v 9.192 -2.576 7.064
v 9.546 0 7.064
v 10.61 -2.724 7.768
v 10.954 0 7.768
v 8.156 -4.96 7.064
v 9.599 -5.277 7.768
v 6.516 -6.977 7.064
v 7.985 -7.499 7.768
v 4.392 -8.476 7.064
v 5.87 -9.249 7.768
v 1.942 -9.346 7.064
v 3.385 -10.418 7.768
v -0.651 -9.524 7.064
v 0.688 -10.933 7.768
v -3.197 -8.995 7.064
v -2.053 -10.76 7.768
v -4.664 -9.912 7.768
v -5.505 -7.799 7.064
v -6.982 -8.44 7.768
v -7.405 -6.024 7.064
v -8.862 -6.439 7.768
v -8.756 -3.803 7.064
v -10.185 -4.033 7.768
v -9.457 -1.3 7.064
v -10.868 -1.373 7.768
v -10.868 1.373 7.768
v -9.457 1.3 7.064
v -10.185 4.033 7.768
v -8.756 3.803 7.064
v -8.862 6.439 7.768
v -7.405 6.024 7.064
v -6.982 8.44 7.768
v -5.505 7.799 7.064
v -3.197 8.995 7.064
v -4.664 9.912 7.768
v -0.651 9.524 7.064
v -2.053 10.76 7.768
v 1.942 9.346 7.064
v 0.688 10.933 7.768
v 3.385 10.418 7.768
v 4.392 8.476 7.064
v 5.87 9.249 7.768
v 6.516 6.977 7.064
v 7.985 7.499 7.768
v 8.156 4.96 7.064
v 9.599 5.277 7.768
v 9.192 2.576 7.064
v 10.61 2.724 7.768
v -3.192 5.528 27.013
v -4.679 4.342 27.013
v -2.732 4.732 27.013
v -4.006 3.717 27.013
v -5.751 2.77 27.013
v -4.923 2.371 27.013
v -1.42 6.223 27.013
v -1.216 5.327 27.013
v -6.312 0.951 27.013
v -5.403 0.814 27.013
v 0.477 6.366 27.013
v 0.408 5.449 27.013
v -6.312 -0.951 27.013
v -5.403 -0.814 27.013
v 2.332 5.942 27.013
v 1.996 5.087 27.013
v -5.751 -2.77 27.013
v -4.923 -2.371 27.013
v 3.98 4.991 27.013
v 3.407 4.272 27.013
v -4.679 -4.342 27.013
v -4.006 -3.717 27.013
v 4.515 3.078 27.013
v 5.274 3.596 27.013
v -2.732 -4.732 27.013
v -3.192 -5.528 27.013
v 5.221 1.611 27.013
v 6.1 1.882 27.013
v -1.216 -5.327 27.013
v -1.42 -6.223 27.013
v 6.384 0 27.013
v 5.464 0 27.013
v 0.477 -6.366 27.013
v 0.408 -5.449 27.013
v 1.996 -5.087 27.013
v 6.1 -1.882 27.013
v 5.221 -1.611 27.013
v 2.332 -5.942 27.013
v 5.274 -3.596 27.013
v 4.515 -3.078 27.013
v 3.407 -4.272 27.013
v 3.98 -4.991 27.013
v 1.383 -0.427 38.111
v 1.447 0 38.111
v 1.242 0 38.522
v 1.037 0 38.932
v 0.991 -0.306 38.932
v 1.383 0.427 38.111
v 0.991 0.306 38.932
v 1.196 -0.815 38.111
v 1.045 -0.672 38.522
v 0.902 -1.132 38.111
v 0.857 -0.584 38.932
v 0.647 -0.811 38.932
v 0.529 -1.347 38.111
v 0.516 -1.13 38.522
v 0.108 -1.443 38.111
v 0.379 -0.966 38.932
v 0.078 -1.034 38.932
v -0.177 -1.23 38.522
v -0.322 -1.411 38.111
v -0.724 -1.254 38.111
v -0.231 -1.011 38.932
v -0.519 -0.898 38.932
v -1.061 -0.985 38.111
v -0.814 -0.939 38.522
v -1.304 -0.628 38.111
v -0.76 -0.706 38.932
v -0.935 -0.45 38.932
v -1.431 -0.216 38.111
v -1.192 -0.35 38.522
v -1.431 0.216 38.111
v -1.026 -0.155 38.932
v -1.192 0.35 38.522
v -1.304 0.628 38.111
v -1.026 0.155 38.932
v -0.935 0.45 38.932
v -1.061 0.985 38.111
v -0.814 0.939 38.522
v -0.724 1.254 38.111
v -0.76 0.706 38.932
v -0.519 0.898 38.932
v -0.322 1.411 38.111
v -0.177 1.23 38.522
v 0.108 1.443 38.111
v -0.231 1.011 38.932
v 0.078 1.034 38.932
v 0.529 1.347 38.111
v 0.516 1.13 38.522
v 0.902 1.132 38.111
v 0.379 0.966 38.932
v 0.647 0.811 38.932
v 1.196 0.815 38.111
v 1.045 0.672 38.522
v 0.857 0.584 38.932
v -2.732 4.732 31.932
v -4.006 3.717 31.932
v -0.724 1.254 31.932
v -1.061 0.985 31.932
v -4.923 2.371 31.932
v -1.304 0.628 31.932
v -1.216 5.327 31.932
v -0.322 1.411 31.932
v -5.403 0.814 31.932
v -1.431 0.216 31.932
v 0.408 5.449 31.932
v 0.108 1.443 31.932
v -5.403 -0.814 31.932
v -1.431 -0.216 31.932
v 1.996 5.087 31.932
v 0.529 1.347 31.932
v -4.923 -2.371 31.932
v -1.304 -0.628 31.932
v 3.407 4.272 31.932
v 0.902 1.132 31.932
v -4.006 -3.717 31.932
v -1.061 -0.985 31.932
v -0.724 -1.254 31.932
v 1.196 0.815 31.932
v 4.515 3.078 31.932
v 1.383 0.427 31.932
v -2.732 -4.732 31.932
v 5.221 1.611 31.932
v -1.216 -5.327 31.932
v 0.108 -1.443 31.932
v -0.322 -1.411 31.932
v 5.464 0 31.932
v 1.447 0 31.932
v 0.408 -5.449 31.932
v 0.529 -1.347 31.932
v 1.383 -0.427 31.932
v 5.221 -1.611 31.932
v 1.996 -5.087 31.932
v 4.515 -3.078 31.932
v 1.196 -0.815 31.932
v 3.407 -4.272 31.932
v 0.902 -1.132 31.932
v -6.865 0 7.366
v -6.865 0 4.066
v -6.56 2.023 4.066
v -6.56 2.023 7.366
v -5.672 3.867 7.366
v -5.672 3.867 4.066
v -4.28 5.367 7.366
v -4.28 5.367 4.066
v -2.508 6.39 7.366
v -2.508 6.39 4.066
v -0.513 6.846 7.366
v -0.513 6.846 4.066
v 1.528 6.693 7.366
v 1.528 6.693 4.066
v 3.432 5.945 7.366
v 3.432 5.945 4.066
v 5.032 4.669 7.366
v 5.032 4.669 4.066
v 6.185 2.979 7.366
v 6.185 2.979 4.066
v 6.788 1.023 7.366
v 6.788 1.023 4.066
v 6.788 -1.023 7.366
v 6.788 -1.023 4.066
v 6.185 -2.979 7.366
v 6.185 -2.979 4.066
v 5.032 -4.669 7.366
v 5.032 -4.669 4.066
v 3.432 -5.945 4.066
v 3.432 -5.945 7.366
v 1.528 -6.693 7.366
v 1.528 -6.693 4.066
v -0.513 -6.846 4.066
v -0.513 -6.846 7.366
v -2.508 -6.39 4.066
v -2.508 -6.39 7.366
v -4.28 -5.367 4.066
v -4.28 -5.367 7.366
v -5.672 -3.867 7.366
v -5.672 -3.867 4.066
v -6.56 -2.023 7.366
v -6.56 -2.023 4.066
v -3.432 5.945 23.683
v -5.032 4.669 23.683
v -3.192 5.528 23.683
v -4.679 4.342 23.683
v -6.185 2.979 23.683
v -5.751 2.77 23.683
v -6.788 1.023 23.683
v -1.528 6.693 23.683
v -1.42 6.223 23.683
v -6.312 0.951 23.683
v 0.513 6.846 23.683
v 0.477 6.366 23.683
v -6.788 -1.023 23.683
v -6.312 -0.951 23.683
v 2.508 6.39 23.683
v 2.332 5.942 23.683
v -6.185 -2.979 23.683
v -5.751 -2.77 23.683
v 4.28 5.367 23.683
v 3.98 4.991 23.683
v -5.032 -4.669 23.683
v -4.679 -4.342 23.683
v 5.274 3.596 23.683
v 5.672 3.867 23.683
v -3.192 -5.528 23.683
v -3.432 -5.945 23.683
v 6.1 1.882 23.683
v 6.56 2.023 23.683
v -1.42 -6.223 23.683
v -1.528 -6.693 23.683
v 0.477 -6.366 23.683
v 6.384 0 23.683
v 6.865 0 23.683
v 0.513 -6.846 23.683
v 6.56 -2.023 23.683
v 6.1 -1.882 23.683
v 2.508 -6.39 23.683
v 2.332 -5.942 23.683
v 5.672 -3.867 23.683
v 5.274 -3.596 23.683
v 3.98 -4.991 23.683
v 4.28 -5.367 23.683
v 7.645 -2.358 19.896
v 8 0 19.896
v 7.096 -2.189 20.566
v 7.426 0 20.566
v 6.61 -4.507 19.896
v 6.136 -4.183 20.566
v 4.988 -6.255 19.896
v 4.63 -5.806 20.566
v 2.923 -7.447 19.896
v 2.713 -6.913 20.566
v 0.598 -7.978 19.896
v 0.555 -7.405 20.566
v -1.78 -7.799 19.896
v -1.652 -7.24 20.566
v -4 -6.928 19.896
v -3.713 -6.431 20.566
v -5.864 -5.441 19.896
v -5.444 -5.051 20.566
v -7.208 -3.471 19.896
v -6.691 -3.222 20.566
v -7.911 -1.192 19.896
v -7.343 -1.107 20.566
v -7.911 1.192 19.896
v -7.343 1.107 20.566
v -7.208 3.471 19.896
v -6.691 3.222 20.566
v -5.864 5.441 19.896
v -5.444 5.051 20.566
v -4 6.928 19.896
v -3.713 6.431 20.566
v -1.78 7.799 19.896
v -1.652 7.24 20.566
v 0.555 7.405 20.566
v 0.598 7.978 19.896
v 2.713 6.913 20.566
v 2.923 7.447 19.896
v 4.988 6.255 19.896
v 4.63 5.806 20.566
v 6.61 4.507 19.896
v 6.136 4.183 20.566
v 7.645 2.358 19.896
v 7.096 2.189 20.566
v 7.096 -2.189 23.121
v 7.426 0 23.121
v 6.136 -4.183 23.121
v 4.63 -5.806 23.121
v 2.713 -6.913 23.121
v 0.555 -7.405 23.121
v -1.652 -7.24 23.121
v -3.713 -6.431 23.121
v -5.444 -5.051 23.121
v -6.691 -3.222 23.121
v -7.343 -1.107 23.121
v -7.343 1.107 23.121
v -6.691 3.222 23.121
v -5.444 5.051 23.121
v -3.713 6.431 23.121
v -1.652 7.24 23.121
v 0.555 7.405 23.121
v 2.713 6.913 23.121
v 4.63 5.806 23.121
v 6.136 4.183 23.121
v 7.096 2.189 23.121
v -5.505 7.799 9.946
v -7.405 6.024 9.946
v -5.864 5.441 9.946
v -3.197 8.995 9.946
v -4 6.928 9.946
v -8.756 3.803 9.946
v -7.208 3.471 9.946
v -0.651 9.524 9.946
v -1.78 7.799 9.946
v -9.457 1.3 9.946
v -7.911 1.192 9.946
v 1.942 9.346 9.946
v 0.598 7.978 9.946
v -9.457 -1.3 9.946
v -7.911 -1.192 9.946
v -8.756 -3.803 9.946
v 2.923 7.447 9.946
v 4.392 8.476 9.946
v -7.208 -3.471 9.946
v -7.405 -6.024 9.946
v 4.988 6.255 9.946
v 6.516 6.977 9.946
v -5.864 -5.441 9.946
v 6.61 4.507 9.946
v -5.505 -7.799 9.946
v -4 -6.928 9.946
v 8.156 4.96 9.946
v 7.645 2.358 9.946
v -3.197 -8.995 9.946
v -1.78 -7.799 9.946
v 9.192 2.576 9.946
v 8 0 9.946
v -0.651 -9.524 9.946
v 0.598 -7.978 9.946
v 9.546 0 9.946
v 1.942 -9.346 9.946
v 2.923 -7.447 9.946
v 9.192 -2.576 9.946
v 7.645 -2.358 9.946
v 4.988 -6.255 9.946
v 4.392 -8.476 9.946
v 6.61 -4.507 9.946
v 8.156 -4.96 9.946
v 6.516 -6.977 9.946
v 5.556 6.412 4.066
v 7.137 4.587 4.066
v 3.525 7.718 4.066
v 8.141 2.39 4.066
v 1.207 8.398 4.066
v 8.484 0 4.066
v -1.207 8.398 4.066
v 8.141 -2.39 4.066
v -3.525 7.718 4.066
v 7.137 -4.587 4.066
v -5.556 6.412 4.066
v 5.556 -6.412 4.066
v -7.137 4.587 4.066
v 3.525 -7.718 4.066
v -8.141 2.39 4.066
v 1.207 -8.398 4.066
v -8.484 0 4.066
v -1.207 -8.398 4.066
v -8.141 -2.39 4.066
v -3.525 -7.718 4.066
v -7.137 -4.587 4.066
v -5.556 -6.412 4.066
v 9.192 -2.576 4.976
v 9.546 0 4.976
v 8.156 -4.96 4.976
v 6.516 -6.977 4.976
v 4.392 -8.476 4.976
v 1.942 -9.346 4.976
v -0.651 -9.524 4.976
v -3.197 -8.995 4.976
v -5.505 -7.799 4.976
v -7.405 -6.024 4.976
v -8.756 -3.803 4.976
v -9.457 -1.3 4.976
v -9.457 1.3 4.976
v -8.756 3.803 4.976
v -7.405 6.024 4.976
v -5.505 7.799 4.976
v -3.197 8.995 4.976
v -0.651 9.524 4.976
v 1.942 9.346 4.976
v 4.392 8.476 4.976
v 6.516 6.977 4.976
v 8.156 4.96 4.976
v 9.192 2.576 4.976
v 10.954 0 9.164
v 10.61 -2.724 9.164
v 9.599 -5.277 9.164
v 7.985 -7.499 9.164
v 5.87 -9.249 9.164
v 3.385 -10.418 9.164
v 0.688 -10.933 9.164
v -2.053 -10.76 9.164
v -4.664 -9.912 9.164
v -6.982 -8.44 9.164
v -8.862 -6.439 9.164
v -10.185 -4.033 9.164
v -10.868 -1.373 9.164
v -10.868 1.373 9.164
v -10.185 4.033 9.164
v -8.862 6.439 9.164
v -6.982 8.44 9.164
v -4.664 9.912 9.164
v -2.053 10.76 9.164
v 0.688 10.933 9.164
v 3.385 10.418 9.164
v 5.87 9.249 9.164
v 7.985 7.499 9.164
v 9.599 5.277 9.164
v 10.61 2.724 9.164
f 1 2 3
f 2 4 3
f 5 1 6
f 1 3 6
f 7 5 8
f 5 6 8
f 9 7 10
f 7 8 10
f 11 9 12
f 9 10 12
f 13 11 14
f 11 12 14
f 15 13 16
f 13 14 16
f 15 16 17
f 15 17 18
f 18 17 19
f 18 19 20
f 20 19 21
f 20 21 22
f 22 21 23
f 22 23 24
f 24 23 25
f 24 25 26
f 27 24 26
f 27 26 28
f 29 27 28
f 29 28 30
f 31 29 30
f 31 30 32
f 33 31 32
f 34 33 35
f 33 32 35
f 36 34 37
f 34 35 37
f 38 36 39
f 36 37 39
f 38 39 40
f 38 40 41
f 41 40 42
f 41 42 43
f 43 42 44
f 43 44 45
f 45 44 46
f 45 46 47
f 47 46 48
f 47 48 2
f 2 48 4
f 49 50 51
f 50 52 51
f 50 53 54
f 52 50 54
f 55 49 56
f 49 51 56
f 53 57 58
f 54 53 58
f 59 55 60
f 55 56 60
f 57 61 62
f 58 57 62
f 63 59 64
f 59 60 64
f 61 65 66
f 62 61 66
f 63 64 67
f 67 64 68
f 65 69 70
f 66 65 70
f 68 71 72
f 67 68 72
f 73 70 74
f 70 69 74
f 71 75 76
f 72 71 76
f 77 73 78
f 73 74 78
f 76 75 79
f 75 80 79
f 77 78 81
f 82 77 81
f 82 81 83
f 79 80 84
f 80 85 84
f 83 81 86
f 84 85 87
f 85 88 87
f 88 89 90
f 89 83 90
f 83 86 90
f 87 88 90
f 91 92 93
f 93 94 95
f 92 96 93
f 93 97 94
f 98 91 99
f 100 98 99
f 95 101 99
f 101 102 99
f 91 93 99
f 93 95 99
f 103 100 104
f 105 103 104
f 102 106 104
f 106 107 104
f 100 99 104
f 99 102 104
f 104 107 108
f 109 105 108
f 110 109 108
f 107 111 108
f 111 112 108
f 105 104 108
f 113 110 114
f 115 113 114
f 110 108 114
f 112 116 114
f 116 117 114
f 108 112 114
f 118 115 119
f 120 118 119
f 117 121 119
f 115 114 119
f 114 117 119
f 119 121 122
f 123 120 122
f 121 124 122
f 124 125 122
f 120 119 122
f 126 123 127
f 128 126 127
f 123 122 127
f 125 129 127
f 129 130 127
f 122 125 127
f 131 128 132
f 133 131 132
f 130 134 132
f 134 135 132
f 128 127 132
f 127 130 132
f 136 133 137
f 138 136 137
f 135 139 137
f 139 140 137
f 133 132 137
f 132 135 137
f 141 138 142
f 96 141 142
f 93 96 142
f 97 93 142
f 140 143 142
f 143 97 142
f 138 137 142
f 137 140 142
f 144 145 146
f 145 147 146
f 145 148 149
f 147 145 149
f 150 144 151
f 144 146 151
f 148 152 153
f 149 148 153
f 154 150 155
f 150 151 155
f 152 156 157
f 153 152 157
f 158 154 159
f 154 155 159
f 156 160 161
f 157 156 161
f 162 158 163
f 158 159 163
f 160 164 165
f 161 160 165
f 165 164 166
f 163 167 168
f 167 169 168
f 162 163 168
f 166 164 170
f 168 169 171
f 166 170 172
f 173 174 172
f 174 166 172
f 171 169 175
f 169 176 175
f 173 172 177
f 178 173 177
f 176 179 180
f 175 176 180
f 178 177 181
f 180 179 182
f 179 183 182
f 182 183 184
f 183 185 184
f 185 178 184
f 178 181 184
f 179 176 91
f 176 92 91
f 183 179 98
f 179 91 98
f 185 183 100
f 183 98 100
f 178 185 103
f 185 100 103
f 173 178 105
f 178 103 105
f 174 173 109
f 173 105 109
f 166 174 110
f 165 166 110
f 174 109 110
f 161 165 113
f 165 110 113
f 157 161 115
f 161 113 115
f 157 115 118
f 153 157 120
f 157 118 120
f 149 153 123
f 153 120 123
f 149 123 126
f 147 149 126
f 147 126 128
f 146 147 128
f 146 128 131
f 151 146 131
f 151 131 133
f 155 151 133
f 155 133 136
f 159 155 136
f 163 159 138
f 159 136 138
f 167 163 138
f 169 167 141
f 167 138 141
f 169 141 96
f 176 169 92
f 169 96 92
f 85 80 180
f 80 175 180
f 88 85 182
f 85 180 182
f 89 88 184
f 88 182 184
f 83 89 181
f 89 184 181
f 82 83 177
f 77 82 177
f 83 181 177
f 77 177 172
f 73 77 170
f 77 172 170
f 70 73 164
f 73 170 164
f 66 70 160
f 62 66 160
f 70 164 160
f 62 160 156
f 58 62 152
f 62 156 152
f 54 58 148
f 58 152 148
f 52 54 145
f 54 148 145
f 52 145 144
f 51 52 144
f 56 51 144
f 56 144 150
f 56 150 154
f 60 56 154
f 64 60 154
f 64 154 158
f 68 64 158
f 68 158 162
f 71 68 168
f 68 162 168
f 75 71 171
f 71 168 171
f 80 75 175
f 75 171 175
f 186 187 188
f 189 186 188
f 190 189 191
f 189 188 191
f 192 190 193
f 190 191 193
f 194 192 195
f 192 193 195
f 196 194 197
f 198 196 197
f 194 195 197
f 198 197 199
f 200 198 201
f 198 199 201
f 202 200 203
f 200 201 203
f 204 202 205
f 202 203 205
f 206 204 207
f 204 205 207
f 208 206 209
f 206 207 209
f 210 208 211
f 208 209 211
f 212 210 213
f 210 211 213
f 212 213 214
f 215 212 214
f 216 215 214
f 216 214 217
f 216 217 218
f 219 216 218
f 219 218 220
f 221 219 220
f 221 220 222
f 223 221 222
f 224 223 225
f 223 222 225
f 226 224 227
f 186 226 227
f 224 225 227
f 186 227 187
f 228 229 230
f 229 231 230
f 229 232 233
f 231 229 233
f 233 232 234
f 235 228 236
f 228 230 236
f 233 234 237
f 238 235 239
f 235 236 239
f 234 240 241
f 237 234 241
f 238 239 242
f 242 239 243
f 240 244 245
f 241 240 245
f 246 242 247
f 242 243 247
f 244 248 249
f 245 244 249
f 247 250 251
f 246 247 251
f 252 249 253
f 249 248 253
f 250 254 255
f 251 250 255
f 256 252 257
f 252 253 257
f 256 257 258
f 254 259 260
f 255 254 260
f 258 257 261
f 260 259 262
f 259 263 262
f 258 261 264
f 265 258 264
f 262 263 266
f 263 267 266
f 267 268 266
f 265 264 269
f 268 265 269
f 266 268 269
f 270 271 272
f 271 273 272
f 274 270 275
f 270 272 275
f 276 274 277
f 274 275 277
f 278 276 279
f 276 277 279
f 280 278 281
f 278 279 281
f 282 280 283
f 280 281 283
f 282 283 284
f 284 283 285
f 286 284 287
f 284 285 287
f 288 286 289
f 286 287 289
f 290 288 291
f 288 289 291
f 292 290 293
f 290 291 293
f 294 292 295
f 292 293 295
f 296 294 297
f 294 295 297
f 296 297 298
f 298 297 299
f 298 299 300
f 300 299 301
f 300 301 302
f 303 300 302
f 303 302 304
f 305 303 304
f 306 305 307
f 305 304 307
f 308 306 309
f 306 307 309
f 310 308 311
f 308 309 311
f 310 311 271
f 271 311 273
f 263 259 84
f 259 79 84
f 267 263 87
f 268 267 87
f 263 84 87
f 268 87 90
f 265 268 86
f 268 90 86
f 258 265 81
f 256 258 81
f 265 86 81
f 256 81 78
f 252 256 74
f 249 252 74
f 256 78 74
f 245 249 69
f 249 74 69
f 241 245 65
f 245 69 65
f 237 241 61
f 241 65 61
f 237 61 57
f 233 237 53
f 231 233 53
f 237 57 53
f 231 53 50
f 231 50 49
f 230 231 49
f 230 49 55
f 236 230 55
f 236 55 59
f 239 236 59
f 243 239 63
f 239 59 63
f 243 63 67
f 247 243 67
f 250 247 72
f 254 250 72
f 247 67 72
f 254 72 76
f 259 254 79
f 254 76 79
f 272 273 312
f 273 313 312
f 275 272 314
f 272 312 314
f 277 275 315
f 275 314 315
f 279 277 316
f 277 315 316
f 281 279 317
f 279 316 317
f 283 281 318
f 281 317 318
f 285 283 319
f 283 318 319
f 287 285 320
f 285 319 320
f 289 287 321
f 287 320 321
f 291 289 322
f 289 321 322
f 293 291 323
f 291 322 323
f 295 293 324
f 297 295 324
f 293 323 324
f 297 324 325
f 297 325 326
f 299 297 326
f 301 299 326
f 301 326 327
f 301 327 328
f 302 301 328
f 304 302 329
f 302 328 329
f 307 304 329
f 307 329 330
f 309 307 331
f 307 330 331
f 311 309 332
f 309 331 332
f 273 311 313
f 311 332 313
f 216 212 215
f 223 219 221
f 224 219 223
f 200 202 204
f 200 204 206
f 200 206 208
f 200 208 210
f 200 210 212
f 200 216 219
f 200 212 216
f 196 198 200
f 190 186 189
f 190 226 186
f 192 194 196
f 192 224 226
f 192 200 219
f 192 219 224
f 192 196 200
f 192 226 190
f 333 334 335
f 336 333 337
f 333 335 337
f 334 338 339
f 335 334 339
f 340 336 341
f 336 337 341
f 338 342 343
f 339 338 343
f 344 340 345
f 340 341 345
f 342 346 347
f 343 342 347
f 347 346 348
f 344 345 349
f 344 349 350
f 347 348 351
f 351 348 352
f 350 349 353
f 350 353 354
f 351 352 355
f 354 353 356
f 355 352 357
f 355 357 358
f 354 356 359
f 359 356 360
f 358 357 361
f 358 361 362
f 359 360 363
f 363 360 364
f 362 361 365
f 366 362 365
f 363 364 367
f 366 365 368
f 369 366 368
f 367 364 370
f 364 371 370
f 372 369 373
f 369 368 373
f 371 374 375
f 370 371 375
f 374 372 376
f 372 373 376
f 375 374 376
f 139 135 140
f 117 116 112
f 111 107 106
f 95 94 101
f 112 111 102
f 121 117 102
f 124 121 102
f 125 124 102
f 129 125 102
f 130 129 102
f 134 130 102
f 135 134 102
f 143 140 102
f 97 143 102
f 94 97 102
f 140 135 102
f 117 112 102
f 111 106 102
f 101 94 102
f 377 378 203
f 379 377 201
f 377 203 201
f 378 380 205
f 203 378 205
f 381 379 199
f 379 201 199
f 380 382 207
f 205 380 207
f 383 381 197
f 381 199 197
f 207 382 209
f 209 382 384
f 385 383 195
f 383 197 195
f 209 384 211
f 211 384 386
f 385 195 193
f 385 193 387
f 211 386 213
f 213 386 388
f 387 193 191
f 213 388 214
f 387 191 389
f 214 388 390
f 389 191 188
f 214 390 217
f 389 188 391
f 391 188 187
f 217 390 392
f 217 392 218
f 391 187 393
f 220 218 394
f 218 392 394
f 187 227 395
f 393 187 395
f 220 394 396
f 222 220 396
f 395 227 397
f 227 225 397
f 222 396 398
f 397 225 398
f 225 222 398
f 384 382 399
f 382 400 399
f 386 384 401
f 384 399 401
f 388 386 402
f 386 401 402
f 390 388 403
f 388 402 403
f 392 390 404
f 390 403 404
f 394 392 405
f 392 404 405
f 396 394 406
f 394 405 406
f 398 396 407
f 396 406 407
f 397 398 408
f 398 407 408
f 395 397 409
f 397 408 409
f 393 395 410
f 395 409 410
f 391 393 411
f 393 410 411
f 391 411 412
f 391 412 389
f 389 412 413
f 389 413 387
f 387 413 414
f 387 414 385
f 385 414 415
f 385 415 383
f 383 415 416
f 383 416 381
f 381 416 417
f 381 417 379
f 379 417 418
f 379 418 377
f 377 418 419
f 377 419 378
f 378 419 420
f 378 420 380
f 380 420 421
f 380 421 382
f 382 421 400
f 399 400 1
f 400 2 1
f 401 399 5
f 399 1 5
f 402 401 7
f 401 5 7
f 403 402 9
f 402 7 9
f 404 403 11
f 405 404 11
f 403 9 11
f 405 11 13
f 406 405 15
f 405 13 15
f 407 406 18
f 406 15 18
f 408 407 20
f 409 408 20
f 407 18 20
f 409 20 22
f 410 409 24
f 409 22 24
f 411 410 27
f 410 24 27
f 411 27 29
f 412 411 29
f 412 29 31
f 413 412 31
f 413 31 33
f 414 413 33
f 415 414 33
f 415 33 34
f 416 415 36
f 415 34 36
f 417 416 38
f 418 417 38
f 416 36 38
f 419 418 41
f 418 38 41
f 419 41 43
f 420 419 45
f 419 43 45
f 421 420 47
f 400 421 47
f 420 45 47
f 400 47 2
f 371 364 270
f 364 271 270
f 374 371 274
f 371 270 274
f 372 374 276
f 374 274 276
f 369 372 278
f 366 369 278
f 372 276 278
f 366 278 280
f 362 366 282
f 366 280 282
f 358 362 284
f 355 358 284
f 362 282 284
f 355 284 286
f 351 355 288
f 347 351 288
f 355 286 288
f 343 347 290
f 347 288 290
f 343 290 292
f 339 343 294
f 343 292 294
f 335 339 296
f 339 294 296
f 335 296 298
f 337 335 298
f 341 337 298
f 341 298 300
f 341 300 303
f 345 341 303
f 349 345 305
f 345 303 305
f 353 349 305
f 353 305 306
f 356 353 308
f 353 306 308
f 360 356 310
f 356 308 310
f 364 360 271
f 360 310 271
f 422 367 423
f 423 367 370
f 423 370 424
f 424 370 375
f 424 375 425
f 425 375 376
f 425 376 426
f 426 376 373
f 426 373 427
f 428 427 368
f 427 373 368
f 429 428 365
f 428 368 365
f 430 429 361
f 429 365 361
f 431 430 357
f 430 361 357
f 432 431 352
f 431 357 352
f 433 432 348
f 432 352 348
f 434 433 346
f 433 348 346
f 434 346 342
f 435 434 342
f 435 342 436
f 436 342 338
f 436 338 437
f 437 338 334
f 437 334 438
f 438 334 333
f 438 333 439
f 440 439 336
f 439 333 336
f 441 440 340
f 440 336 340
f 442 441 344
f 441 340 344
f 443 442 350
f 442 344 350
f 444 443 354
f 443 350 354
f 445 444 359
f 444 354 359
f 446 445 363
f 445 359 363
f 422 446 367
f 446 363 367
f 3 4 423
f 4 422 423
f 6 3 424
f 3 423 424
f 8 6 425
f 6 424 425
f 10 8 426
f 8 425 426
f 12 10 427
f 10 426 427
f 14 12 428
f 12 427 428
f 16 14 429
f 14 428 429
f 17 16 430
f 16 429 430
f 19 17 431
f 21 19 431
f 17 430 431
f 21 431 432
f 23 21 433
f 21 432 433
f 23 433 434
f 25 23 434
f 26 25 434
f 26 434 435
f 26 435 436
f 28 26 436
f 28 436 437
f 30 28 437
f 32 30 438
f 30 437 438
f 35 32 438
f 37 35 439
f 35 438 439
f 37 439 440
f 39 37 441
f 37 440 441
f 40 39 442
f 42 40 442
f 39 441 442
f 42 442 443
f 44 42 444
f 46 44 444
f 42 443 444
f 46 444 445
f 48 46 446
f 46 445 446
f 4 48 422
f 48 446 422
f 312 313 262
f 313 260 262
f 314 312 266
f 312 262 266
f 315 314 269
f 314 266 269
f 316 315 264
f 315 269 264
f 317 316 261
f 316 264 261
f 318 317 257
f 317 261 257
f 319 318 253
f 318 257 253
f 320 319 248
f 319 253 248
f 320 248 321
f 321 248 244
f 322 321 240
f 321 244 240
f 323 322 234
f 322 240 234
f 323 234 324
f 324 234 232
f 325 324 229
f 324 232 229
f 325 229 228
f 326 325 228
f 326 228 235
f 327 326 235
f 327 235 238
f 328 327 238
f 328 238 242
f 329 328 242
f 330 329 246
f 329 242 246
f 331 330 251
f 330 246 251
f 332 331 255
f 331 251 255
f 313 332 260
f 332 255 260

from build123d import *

# Parameters (mm, degrees)
SKETCH6_R          = 6.864817117
CUT_EXTRUDE2_DEPTH = 3.3
SKETCH5_R          = 50.459472618
CUT_EXTRUDE1_DEPTH = 25


with BuildPart() as part:
    # Sketch1 → Revolve2 (revolve)
    with BuildSketch(Plane(origin=(0, 0, 0), x_dir=(0, 0, -1), z_dir=(1, 0, 0))):
        with BuildLine():
            Line((1.771e-06, 9.5), (1.771e-06, 7.445611339))
            Line((1.771e-06, 7.445611339), (-0.771464581, 7.445611339))
            Line((-0.771464581, 7.445611339), (-0.771464581, 6.864817117))
            Line((-0.771464581, 6.864817117), (-4.066354879, 6.864817117))
            Line((-4.066354879, 6.864817117), (-4.066354879, 8.484339467))
            Line((-4.066354879, 8.484339467), (-4.975618005, 9.546154997))
            Line((-4.975618005, 9.546154997), (-7.06424338, 9.546154997))
            Line((-7.06424338, 9.546154997), (-7.767897919, 10.954193429))
            Line((-7.767897919, 10.954193429), (-9.164037876, 10.954193429))
            Line((-9.164037876, 10.954193429), (-9.945876251, 9.546154997))
            Line((-9.945876251, 9.546154997), (-9.945876251, 8))
            Line((-9.945876251, 8), (-19.896053439, 8))
            Line((-19.896053439, 8), (-20.566354879, 7.426001631))
            Line((-20.566354879, 7.426001631), (-23.121440557, 7.426001631))
            Line((-23.121440557, 7.426001631), (-23.682625072, 6.864817117))
            Line((-23.682625072, 6.864817117), (-23.682625072, 6.383537324))
            Line((-23.682625072, 6.383537324), (-27.0133813, 6.383537324))
            Line((-27.0133813, 6.383537324), (-27.0133813, 5.464238658))
            Line((-27.0133813, 5.464238658), (-31.931960755, 5.464238658))
            Line((-31.931960755, 5.464238658), (-31.931960755, 1.447456583))
            Line((-31.931960755, 1.447456583), (-38.111348046, 1.447456583))
            Line((-38.111348046, 1.447456583), (-38.931960755, 1.037362766))
            Line((-38.931960755, 1.037362766), (-38.931960755, 0))
            Line((-38.931960755, 0), (2.933645121, 0))
            ThreePointArc((2.933645121, 0), (2.489100327, 4.831124101), (1.170397182, 9.5))
            Line((1.170397182, 9.5), (1.771e-06, 9.5))
        make_face()
    revolve(axis=Axis((0, 0, 38.931960755), (0, 0, -1)))


with BuildPart() as body_2:
    # Split1: the piece on the far side of the plane
    add(part.part)
    split(bisect_by=Plane(origin=(0, 6.864817117, 4.066354879), x_dir=(1, 0, 0), z_dir=(0, 0, 1)), keep=Keep.BOTTOM)

    # Sketch5 → Cut-Extrude1 (cut)
    with BuildSketch(Plane(origin=(0, 0, 4.066354879), x_dir=(-1, 0, 0), z_dir=(0, 0, -1))):
        Circle(SKETCH5_R)
    extrude(amount=CUT_EXTRUDE1_DEPTH, mode=Mode.SUBTRACT)


with BuildPart() as part_1:
    add(part.part)

    # Split1
    split(bisect_by=Plane(origin=(0, 6.864817117, 4.066354879), x_dir=(1, 0, 0), z_dir=(0, 0, 1)), keep=Keep.TOP)

    # Sketch6 → Cut-Extrude2 (cut)
    with BuildSketch(Plane(origin=(0, 0, 4.066354879), x_dir=(-1, 0, 0), z_dir=(0, 0, -1))):
        Circle(SKETCH6_R)
    extrude(amount=-CUT_EXTRUDE2_DEPTH, mode=Mode.SUBTRACT)


solid = part_1.part
